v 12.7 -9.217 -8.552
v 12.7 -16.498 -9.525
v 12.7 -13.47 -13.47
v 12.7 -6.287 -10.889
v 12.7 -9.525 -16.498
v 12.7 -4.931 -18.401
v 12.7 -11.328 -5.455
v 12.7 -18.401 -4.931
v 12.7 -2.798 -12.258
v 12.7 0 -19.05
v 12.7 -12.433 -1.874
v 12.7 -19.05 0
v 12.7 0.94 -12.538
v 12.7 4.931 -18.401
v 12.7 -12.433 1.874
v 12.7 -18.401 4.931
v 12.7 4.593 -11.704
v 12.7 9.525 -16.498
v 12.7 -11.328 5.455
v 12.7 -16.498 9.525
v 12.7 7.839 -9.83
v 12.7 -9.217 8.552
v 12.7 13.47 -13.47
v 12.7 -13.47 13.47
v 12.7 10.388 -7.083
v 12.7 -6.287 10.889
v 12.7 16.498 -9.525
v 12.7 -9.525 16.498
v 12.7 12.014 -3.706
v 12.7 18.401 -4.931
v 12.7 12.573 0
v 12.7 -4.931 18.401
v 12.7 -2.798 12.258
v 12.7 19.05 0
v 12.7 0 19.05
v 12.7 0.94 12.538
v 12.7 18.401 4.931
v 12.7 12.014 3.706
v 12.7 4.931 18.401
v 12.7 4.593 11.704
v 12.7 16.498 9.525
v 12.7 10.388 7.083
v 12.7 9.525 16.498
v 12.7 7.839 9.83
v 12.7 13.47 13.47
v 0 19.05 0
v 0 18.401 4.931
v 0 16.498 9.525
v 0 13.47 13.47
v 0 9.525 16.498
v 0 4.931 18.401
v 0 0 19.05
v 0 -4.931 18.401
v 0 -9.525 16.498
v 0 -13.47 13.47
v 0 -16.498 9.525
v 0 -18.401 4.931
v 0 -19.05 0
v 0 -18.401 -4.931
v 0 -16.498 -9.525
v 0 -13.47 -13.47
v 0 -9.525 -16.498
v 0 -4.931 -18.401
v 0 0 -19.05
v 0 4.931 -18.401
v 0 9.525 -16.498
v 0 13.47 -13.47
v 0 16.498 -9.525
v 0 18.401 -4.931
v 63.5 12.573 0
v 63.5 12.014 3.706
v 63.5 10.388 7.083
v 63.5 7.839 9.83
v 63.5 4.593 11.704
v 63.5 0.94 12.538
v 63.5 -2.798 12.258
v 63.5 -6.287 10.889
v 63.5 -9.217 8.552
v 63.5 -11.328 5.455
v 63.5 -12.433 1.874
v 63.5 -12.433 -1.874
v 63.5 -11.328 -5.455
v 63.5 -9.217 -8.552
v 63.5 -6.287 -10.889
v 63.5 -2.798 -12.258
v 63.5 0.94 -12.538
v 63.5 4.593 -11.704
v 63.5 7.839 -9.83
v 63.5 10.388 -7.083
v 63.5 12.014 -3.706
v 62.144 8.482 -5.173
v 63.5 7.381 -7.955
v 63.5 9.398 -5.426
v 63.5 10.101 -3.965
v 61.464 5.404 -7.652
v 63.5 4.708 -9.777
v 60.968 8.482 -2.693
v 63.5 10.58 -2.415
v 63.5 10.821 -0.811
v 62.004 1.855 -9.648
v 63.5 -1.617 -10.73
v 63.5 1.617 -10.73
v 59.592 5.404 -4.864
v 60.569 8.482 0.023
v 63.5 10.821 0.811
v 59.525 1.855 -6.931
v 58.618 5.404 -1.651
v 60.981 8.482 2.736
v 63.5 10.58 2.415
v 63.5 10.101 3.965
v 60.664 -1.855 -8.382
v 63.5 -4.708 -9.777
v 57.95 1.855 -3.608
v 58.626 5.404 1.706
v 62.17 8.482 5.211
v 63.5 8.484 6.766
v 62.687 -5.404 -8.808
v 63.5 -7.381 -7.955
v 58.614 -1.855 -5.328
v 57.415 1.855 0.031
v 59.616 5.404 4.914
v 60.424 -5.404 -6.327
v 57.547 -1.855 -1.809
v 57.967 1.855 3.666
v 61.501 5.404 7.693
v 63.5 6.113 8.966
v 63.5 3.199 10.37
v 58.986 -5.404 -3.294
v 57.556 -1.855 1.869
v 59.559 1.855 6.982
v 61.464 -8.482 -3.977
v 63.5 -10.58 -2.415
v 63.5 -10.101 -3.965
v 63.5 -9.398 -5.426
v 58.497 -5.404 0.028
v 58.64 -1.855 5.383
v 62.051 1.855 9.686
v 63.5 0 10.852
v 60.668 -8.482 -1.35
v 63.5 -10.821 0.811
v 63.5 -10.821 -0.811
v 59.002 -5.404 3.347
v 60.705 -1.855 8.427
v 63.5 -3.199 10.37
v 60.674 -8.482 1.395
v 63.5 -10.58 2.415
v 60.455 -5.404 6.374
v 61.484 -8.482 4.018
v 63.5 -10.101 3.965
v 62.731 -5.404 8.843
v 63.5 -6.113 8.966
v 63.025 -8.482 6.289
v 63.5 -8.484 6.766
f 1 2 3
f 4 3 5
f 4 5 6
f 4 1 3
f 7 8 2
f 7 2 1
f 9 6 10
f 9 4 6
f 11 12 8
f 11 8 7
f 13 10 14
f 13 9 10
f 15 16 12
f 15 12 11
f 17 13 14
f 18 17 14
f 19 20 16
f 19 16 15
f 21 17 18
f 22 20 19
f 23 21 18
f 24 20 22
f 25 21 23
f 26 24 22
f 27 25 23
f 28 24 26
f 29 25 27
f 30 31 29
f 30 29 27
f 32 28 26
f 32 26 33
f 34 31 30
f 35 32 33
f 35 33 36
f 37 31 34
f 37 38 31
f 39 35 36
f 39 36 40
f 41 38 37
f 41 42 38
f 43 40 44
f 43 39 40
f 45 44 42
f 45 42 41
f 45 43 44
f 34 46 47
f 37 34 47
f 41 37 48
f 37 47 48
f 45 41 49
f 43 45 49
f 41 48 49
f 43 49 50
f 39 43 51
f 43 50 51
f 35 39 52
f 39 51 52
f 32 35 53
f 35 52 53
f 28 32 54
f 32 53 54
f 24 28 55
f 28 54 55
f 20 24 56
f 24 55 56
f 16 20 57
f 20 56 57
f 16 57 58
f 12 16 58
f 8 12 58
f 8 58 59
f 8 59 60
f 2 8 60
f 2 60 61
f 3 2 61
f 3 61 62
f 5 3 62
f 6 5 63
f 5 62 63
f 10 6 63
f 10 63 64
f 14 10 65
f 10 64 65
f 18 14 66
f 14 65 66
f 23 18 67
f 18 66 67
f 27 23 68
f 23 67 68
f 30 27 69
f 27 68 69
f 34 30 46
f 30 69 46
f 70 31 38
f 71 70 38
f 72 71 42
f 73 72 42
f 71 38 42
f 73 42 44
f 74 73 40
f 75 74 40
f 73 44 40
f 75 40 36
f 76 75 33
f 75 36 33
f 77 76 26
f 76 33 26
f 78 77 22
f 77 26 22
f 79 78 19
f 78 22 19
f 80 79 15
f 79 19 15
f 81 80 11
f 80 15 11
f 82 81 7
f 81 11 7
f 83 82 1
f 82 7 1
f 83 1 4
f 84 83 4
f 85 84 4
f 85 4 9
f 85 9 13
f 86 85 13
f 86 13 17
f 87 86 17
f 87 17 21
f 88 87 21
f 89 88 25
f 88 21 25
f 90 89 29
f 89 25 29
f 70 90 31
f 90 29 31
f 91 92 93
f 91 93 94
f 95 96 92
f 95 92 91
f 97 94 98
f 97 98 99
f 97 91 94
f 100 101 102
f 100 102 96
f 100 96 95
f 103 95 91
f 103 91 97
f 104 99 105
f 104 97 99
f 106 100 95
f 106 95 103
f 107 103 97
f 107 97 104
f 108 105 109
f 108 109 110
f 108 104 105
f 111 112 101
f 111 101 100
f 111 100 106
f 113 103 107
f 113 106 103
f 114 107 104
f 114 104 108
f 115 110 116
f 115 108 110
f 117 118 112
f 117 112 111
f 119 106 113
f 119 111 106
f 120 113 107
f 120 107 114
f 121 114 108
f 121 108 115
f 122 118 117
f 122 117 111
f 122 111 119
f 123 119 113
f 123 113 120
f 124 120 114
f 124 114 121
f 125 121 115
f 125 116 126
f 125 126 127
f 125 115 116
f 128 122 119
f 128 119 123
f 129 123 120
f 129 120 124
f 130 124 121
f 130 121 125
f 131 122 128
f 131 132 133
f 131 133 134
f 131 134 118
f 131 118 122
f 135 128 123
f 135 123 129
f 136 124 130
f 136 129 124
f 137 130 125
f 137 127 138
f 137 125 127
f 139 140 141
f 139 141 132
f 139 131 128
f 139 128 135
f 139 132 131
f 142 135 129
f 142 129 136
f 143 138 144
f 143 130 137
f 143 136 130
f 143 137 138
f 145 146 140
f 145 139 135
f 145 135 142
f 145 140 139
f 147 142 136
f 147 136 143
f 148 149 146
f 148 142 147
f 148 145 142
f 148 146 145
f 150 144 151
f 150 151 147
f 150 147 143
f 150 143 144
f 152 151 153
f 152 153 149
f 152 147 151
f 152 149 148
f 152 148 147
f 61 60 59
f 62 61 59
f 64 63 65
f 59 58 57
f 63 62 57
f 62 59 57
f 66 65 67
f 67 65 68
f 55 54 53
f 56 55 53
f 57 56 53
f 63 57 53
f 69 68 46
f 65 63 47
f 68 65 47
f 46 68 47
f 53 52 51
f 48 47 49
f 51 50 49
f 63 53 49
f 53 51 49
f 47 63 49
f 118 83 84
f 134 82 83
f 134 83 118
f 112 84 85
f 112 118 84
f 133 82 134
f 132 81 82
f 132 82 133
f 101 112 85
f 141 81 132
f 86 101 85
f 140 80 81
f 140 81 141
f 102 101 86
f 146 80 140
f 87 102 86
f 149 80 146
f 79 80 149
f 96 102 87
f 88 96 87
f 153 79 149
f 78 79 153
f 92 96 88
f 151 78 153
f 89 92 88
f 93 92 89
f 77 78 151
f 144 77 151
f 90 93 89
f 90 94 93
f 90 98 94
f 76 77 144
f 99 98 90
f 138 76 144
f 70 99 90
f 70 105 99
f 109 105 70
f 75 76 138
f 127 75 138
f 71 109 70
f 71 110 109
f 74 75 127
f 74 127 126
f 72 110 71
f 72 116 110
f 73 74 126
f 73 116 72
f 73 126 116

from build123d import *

# Parameters (mm, degrees)
F0_R     = 19.05
F1_DEPTH = 12.7
F2_R     = 12.573
F3_DEPTH = 50.8


with BuildPart() as f1:
    # F0 (on Right) → F1 (new body)
    with BuildSketch(Plane.YZ):
        Circle(F0_R)
    extrude(amount=F1_DEPTH)

    # F2 (on face) → F3 (join)
    with BuildSketch(Plane.YZ.offset(12.7)):
        Circle(F2_R)
    extrude(amount=F3_DEPTH)

    # F5 (on offset) → F6 (revolve, cut)
    with BuildSketch(Plane.YZ.offset(69.85)):
        with BuildLine():
            Line((-12.573, 0), (12.573, 0))
            ThreePointArc((12.573, 0), (0, 12.573), (-12.573, 0))
        make_face()
    revolve(axis=Axis((69.85, 16.413388, 0), (0, 1, 0)), mode=Mode.SUBTRACT)


solid = f1.part
